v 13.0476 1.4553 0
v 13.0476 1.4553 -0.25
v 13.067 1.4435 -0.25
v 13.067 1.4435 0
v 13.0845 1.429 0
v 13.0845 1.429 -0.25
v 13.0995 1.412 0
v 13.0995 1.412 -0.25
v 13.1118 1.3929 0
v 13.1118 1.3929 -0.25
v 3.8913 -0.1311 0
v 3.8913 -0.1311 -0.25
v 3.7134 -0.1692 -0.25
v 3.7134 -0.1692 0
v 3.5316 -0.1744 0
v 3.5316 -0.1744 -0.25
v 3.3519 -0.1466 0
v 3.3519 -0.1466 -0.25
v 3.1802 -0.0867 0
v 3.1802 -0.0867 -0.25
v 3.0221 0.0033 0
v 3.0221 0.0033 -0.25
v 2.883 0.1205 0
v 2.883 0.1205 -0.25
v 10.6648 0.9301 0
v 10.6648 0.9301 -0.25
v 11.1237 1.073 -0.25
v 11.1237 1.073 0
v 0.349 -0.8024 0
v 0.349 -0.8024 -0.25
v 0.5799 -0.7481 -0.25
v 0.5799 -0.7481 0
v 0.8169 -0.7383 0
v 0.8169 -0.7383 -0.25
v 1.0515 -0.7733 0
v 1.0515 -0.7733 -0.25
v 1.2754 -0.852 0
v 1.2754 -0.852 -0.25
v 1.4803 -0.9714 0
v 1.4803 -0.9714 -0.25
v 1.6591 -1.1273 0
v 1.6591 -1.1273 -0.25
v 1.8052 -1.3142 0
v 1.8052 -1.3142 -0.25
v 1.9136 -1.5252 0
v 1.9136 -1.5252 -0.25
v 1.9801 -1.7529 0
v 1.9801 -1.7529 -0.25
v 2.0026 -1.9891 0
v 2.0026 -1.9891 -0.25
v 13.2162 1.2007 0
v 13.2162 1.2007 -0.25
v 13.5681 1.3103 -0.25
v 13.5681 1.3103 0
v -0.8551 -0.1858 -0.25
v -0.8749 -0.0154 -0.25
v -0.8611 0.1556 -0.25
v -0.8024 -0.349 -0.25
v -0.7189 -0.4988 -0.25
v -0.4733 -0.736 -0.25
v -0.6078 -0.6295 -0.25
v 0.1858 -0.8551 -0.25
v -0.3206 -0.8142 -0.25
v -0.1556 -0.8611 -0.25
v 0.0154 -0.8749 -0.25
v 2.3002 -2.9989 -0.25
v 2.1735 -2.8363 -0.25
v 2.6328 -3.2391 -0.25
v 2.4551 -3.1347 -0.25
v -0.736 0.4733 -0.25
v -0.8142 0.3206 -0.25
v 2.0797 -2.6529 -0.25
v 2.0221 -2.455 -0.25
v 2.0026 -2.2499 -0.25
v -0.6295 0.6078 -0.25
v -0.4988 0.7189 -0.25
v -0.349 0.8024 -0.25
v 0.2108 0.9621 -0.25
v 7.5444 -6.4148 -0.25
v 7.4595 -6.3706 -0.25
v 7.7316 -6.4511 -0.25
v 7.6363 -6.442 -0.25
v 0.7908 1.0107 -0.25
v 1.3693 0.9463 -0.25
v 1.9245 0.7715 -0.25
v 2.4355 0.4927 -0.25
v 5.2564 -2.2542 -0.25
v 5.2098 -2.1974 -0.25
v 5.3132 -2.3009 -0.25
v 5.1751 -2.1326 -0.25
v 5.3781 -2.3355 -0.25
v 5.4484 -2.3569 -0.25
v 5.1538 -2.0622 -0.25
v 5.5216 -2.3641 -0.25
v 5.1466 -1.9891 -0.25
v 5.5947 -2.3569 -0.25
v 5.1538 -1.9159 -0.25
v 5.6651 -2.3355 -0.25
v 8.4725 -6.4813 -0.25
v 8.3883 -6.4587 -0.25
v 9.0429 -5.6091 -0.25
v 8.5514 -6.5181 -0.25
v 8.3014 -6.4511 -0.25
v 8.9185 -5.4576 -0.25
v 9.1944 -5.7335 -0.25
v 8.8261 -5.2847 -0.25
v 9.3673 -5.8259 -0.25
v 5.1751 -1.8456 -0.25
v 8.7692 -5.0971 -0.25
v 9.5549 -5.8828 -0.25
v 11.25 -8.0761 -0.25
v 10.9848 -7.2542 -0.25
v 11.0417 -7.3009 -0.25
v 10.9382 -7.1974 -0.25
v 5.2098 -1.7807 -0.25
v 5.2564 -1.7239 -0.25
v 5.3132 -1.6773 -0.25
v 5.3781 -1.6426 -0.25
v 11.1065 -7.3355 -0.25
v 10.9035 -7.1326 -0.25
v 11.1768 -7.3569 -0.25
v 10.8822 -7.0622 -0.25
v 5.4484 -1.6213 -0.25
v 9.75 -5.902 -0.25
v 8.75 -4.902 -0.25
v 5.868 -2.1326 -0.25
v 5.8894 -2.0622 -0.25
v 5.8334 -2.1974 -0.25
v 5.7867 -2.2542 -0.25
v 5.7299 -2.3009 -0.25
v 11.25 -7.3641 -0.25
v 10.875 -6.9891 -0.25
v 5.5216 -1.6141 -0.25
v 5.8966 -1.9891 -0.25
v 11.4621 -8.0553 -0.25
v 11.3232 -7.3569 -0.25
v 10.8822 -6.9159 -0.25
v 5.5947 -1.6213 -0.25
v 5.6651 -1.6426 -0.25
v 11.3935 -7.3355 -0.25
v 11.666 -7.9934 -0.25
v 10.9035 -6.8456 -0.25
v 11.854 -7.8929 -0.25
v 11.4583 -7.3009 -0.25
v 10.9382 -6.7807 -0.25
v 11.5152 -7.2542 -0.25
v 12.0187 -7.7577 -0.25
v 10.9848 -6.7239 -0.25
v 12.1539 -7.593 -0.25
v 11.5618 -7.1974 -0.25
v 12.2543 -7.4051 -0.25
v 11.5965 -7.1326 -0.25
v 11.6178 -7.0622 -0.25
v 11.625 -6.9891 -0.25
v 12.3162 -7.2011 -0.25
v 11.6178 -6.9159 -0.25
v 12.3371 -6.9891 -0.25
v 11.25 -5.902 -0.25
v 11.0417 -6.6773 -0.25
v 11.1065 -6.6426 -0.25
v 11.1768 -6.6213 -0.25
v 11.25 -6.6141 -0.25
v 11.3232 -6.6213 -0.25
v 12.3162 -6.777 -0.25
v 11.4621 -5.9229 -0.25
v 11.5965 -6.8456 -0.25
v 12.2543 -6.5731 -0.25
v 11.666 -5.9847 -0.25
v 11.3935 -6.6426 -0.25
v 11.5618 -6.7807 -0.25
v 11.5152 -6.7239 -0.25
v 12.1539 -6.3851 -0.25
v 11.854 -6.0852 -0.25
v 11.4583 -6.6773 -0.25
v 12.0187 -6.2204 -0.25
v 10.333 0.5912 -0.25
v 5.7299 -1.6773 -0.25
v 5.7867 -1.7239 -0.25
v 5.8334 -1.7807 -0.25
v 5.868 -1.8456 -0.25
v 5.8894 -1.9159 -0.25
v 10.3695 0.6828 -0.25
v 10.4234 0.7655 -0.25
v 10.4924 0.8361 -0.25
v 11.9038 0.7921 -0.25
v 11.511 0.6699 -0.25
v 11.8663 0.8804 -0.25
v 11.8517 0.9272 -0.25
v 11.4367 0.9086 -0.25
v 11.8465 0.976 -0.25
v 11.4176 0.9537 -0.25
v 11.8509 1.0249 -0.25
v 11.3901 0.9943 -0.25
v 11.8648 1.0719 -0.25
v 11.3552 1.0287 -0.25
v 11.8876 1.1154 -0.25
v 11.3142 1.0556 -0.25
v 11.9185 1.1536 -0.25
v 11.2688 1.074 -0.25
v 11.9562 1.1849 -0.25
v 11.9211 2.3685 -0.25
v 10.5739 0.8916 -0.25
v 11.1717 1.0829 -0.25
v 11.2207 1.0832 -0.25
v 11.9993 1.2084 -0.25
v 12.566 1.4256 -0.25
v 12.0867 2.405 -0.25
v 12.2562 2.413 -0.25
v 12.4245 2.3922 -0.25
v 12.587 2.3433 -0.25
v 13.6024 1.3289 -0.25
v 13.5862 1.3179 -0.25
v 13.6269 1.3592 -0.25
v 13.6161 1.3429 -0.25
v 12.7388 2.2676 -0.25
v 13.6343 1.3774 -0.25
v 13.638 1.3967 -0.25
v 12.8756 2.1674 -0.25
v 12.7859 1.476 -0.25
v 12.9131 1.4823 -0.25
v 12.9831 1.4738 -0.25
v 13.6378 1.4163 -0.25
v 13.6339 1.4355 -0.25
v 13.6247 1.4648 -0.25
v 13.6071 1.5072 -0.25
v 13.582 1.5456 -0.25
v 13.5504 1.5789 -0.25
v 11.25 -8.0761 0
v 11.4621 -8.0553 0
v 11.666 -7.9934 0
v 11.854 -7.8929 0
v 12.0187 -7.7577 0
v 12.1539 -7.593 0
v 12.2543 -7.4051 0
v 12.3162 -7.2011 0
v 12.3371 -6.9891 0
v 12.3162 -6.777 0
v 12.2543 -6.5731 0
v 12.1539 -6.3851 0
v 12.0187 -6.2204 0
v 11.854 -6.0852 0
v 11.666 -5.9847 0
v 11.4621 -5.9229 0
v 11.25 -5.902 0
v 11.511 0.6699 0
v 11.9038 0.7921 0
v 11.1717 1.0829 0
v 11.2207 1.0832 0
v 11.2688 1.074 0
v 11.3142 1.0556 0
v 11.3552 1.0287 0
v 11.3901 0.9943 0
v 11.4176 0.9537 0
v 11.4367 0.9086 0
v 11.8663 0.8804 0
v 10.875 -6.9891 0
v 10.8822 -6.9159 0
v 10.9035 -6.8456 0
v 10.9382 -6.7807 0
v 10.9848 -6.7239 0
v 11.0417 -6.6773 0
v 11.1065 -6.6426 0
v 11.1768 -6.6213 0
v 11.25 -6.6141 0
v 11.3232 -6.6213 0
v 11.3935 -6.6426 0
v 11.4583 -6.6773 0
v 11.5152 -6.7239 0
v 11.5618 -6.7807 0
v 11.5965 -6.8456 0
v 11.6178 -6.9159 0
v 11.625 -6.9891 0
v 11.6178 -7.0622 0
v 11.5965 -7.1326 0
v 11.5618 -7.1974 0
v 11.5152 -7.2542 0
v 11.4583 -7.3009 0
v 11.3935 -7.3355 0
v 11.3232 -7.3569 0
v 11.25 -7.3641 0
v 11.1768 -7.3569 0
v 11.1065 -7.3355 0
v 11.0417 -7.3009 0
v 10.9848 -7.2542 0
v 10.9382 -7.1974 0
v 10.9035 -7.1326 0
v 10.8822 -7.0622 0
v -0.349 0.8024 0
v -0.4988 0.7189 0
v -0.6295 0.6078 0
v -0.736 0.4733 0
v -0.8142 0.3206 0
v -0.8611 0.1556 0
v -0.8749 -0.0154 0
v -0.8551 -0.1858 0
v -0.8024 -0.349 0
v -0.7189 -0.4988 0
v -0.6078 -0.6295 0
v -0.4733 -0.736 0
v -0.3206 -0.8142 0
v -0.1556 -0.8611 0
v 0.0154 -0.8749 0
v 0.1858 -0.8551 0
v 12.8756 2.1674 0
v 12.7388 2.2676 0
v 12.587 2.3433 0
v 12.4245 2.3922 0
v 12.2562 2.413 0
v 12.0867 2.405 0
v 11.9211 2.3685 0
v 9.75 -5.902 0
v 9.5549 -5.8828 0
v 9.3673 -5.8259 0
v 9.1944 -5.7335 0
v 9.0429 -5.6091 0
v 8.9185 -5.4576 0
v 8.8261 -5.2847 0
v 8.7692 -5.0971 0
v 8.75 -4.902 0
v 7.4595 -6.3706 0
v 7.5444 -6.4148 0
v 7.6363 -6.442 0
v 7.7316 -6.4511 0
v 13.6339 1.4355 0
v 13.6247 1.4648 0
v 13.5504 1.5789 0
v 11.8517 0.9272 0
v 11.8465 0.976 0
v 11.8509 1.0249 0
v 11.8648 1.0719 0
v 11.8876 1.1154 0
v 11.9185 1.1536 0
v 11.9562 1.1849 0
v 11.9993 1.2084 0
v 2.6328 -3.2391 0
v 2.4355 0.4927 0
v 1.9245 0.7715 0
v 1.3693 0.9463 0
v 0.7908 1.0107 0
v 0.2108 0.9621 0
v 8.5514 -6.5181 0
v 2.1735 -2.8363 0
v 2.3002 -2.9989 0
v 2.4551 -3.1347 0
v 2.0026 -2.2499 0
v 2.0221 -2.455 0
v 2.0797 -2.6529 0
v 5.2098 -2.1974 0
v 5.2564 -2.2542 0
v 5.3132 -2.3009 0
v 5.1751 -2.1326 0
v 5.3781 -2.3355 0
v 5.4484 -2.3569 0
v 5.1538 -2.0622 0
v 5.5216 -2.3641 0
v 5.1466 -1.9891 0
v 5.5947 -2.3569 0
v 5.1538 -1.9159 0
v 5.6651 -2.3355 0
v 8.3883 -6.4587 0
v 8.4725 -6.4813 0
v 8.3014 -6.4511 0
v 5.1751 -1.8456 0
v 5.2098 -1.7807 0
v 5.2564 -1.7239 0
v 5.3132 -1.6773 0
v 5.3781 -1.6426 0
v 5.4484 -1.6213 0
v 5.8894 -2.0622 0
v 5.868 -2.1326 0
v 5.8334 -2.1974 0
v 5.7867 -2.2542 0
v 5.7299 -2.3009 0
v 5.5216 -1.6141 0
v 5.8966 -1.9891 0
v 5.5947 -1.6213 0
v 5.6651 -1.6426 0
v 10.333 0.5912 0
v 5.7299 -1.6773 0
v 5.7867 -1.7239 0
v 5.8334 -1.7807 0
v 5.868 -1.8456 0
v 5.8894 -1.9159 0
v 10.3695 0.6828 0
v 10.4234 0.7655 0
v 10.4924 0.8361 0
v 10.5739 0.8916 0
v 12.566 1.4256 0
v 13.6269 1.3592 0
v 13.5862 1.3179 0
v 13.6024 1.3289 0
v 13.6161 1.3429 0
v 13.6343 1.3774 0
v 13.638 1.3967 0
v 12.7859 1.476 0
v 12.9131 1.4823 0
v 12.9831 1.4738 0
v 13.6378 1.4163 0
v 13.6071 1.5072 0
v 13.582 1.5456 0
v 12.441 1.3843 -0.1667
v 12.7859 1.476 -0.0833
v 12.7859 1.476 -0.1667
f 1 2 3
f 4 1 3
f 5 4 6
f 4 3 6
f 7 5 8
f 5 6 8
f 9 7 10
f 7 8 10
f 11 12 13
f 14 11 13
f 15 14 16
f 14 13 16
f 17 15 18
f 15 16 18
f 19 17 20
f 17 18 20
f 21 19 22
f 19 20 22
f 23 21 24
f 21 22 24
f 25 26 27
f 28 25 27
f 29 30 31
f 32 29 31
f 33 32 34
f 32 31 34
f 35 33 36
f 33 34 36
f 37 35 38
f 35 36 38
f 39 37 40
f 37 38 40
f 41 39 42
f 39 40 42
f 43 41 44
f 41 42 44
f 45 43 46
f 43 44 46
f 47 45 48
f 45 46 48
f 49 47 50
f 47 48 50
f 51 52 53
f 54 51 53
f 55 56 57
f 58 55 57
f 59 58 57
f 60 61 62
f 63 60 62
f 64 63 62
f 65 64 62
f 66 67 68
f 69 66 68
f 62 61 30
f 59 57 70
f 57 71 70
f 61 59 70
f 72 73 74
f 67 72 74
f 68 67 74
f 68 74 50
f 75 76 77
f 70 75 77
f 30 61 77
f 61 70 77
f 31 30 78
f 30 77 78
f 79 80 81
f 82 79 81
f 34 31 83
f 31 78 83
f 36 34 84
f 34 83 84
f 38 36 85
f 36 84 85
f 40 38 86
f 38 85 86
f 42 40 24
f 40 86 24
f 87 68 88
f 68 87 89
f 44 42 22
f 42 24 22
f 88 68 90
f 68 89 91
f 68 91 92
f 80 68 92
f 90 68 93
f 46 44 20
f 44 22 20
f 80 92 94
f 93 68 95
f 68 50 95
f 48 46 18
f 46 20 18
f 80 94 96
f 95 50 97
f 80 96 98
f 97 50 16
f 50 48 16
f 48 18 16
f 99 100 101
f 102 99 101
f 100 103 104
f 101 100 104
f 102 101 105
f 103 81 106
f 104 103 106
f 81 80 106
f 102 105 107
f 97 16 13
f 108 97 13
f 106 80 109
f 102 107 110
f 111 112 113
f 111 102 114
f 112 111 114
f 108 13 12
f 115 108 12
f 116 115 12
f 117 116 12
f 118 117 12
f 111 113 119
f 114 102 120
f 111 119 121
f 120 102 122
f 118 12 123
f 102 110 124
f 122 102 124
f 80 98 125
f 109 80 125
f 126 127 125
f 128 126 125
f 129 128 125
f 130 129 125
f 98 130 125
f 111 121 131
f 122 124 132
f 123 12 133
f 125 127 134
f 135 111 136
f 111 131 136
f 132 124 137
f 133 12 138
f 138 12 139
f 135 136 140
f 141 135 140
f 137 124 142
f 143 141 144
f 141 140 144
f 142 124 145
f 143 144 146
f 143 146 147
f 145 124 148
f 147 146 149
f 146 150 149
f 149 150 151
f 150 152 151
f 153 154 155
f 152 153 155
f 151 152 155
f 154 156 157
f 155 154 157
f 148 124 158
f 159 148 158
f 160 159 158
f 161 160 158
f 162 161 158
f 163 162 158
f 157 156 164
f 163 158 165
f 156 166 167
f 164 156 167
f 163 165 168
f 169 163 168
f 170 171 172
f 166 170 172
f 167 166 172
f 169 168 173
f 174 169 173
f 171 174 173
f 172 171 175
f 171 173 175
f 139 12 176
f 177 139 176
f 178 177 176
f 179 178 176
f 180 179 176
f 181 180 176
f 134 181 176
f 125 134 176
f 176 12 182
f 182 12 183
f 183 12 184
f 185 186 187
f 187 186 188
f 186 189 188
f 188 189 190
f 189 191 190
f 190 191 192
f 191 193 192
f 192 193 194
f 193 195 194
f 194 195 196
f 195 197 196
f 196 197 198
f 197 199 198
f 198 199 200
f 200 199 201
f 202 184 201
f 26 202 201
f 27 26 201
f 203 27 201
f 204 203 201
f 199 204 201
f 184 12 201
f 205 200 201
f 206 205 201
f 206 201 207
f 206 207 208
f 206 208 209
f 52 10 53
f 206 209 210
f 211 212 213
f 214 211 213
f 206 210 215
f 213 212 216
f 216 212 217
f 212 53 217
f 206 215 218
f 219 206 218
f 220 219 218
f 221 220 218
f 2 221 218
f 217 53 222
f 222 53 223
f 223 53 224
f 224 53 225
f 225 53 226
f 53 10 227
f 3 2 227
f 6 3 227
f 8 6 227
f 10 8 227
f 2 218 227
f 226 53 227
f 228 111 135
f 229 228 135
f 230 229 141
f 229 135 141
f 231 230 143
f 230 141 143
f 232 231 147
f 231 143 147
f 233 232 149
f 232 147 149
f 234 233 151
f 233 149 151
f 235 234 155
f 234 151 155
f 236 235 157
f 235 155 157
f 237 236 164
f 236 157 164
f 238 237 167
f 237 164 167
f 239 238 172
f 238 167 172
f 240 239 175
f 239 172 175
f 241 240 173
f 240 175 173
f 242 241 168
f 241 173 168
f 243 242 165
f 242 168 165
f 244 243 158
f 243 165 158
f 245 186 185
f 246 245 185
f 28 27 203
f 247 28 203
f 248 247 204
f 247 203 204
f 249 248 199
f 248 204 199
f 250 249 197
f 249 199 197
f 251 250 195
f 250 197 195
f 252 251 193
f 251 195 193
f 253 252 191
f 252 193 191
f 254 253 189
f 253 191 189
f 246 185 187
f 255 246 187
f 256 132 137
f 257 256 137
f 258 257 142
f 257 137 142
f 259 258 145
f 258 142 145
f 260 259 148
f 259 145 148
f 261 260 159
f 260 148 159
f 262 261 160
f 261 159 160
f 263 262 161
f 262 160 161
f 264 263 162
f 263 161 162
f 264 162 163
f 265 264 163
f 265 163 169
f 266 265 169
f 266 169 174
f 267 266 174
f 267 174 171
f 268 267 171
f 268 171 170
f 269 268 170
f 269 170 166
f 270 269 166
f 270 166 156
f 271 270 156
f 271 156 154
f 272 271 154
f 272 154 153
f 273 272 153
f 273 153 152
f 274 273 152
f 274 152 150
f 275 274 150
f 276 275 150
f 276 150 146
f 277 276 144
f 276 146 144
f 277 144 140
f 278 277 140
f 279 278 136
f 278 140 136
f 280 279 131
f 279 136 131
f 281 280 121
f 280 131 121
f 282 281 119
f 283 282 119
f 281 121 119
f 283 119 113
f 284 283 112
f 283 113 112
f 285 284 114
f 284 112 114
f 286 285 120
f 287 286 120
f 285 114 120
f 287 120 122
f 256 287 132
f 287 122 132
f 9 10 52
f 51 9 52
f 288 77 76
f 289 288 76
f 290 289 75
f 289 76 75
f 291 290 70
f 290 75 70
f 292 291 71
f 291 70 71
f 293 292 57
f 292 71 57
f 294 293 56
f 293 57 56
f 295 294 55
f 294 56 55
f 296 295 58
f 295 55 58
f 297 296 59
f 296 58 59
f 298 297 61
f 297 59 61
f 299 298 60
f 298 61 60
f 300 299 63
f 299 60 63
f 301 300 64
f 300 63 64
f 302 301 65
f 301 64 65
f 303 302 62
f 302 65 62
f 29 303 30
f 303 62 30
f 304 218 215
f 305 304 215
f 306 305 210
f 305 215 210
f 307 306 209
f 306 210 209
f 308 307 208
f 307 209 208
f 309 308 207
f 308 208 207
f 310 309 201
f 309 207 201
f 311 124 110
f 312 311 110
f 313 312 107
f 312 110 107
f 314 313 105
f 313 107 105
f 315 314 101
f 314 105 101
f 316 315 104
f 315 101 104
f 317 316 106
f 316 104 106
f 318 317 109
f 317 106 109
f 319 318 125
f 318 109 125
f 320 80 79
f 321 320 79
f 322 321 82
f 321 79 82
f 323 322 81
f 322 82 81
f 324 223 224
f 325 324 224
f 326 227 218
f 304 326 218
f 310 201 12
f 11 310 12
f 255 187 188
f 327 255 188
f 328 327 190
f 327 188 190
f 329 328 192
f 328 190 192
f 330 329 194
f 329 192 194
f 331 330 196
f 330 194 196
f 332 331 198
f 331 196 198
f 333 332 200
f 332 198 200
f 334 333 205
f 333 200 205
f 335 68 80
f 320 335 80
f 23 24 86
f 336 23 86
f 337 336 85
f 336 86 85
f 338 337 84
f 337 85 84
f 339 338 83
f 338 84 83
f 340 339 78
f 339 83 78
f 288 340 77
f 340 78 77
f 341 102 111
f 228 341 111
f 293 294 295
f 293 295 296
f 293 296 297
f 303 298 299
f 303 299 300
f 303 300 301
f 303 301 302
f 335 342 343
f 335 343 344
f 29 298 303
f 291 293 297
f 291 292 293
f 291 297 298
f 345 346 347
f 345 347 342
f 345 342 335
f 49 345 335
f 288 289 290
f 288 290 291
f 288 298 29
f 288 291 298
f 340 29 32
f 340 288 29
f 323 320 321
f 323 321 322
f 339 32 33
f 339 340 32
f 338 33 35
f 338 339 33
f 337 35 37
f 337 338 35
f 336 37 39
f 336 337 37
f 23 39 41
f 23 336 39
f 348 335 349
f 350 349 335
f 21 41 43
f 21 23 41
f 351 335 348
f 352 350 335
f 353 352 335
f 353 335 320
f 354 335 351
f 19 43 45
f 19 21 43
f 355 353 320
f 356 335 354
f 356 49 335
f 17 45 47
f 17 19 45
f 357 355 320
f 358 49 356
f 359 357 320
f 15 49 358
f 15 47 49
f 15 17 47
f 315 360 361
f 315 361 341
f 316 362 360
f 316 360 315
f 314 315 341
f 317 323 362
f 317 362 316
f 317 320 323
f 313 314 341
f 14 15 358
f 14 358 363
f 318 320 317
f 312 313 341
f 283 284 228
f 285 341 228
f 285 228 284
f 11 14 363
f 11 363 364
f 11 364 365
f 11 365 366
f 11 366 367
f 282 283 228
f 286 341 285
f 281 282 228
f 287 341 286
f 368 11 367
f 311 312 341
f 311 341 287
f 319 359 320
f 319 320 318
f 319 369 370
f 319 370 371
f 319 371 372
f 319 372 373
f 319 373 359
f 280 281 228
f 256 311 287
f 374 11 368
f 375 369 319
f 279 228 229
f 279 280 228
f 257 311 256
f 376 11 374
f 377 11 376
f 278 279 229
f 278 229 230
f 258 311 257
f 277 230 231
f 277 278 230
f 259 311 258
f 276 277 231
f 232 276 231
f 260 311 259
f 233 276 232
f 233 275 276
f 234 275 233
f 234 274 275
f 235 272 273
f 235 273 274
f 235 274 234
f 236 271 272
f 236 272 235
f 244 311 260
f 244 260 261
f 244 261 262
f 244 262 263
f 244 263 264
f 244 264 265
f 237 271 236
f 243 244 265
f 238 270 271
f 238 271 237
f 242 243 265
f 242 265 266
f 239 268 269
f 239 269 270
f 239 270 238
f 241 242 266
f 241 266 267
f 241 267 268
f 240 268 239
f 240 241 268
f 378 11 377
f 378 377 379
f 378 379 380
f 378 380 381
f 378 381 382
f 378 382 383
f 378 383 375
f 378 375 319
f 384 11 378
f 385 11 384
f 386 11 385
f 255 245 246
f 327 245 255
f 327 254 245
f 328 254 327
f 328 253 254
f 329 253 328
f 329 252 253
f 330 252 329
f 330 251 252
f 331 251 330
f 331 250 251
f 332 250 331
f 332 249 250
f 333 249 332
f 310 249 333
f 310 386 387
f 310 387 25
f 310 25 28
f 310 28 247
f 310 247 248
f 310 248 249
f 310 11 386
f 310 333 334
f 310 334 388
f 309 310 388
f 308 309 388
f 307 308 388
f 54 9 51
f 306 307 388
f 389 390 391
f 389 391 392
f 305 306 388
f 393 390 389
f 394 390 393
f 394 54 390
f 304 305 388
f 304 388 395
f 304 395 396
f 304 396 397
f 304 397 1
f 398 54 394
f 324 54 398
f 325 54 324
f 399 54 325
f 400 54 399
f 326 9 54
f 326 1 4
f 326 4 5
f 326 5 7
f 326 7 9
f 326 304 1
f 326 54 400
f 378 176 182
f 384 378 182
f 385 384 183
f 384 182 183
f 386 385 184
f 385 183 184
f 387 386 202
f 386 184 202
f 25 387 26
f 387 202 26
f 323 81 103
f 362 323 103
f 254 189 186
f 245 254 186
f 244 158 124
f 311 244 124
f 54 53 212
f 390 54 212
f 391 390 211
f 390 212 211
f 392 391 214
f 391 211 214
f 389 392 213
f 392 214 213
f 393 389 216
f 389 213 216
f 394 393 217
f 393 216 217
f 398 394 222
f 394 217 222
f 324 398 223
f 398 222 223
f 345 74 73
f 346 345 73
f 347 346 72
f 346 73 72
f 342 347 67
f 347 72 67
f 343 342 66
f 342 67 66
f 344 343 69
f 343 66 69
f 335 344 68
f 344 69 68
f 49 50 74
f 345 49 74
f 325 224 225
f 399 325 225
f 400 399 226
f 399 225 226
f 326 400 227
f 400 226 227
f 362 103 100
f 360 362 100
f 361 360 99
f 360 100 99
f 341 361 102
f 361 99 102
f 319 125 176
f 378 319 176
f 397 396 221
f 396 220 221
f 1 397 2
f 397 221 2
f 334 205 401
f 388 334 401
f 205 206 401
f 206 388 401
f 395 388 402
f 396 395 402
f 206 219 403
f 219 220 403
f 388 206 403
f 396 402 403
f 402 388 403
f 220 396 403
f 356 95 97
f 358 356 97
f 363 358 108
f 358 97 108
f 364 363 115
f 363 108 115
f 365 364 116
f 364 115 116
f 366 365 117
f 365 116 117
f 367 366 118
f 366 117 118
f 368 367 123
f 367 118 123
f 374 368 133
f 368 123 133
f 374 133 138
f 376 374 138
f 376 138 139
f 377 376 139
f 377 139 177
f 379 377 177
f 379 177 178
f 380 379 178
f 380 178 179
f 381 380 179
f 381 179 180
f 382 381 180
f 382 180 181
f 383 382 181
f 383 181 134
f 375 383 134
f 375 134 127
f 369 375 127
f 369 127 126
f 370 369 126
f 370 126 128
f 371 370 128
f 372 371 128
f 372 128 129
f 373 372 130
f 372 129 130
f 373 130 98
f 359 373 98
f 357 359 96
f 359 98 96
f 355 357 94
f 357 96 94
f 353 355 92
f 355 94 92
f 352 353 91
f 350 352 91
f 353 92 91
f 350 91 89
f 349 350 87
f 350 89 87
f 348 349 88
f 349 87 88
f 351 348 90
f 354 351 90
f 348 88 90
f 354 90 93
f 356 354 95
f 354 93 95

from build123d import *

# Parameters (mm, degrees)
BRIDA_START                = -0.25
BRIDA_BASE1_DEPTH          = 0.25
TALADRO_ROSCADO_M1X0_251_D = 0.75


# Read off the part's stored shape, not the designer's step: Brida base1
with BuildPart() as part:
    # Brida base1 outline → Brida base1 (new body)
    with BuildSketch(Plane.XY.offset(BRIDA_START)):
        with BuildLine():
            ThreePointArc((0.348995339, -0.802388468), (1.480310371, -0.971394868), (2.002599123, -1.989064424))
            Line((2.002599123, -1.989064424), (2.002599123, -2.249894418))
            ThreePointArc((2.002599123, -2.249894418), (2.173526137, -2.836318439), (2.632769916, -3.239064424))
            Line((2.632769916, -3.239064424), (7.459467188, -6.370598579))
            ThreePointArc((7.459467188, -6.370598579), (7.589701514, -6.430586338), (7.731605769, -6.45114585))
            Line((7.731605769, -6.45114585), (8.301442841, -6.45114585))
            ThreePointArc((8.301442841, -6.45114585), (8.430852364, -6.468182936), (8.551442841, -6.518133148))
            Line((8.551442841, -6.518133148), (11.25, -8.07614585))
            ThreePointArc((11.25, -8.07614585), (12.337081426, -6.989064424), (11.25, -5.901982998))
            Line((11.25, -5.901982998), (9.75, -5.901982998))
            ThreePointArc((9.75, -5.901982998), (9.042893219, -5.609089779), (8.75, -4.901982998))
            Line((8.75, -4.901982998), (10.332976724, 0.591177382))
            ThreePointArc((10.332976724, 0.591177382), (10.456141159, 0.802507984), (10.664811028, 0.930128463))
            Line((10.664811028, 0.930128463), (11.123681953, 1.072973914))
            ThreePointArc((11.123681953, 1.072973914), (11.314233531, 1.055602999), (11.436690752, 0.908579595))
            Line((11.436690752, 0.908579595), (11.510997991, 0.669878036))
            Line((11.510997991, 0.669878036), (11.903767414, 0.792146243))
            Line((11.903767414, 0.792146243), (11.866336414, 0.880361426))
            ThreePointArc((11.866336414, 0.880361426), (11.864794565, 1.071948516), (11.999325595, 1.208364763))
            add(Edge.make_bspline(
                [(11.999325595, 1.208364763), (12.49380663, 1.416910388), (12.823037685, 1.541751032), (13.047571984, 1.455257851)],
                knots=[0, 0, 0, 0, 1, 1, 1, 1], degree=3))
            ThreePointArc((13.047571984, 1.455257851), (13.084455869, 1.42899739), (13.111823575, 1.392927439))
            Line((13.111823575, 1.392927439), (13.216225488, 1.200711385))
            Line((13.216225488, 1.200711385), (13.568106318, 1.310251069))
            ThreePointArc((13.568106318, 1.310251069), (13.62691568, 1.359233957), (13.633864046, 1.435454588))
            Line((13.633864046, 1.435454588), (13.624738221, 1.464770016))
            ThreePointArc((13.624738221, 1.464770016), (13.595468937, 1.526984286), (13.550358844, 1.578872492))
            Line((13.550358844, 1.578872492), (12.875597811, 2.16736765))
            ThreePointArc((12.875597811, 2.16736765), (12.424531871, 2.392233856), (11.921080127, 2.368535026))
            Line((11.921080127, 2.368535026), (3.891256423, -0.131130397))
            ThreePointArc((3.891256423, -0.131130397), (3.351888367, -0.146565708), (2.883020599, 0.120490773))
            ThreePointArc((2.883020599, 0.120490773), (1.369312664, 0.946314909), (-0.348995339, 0.802388468))
            ThreePointArc((-0.348995339, 0.802388468), (-0.802388468, -0.348995339), (0.348995339, -0.802388468))
        make_face()
    extrude(amount=BRIDA_BASE1_DEPTH)

    # Taladro roscado M1x0.251 (through all)
    with Locations(Plane.XY):
        with Locations((5.521572875, -1.989064424), (11.25, -6.989064424), (0.75, -1.989064424)):
            Hole(TALADRO_ROSCADO_M1X0_251_D / 2)


solid = part.part
